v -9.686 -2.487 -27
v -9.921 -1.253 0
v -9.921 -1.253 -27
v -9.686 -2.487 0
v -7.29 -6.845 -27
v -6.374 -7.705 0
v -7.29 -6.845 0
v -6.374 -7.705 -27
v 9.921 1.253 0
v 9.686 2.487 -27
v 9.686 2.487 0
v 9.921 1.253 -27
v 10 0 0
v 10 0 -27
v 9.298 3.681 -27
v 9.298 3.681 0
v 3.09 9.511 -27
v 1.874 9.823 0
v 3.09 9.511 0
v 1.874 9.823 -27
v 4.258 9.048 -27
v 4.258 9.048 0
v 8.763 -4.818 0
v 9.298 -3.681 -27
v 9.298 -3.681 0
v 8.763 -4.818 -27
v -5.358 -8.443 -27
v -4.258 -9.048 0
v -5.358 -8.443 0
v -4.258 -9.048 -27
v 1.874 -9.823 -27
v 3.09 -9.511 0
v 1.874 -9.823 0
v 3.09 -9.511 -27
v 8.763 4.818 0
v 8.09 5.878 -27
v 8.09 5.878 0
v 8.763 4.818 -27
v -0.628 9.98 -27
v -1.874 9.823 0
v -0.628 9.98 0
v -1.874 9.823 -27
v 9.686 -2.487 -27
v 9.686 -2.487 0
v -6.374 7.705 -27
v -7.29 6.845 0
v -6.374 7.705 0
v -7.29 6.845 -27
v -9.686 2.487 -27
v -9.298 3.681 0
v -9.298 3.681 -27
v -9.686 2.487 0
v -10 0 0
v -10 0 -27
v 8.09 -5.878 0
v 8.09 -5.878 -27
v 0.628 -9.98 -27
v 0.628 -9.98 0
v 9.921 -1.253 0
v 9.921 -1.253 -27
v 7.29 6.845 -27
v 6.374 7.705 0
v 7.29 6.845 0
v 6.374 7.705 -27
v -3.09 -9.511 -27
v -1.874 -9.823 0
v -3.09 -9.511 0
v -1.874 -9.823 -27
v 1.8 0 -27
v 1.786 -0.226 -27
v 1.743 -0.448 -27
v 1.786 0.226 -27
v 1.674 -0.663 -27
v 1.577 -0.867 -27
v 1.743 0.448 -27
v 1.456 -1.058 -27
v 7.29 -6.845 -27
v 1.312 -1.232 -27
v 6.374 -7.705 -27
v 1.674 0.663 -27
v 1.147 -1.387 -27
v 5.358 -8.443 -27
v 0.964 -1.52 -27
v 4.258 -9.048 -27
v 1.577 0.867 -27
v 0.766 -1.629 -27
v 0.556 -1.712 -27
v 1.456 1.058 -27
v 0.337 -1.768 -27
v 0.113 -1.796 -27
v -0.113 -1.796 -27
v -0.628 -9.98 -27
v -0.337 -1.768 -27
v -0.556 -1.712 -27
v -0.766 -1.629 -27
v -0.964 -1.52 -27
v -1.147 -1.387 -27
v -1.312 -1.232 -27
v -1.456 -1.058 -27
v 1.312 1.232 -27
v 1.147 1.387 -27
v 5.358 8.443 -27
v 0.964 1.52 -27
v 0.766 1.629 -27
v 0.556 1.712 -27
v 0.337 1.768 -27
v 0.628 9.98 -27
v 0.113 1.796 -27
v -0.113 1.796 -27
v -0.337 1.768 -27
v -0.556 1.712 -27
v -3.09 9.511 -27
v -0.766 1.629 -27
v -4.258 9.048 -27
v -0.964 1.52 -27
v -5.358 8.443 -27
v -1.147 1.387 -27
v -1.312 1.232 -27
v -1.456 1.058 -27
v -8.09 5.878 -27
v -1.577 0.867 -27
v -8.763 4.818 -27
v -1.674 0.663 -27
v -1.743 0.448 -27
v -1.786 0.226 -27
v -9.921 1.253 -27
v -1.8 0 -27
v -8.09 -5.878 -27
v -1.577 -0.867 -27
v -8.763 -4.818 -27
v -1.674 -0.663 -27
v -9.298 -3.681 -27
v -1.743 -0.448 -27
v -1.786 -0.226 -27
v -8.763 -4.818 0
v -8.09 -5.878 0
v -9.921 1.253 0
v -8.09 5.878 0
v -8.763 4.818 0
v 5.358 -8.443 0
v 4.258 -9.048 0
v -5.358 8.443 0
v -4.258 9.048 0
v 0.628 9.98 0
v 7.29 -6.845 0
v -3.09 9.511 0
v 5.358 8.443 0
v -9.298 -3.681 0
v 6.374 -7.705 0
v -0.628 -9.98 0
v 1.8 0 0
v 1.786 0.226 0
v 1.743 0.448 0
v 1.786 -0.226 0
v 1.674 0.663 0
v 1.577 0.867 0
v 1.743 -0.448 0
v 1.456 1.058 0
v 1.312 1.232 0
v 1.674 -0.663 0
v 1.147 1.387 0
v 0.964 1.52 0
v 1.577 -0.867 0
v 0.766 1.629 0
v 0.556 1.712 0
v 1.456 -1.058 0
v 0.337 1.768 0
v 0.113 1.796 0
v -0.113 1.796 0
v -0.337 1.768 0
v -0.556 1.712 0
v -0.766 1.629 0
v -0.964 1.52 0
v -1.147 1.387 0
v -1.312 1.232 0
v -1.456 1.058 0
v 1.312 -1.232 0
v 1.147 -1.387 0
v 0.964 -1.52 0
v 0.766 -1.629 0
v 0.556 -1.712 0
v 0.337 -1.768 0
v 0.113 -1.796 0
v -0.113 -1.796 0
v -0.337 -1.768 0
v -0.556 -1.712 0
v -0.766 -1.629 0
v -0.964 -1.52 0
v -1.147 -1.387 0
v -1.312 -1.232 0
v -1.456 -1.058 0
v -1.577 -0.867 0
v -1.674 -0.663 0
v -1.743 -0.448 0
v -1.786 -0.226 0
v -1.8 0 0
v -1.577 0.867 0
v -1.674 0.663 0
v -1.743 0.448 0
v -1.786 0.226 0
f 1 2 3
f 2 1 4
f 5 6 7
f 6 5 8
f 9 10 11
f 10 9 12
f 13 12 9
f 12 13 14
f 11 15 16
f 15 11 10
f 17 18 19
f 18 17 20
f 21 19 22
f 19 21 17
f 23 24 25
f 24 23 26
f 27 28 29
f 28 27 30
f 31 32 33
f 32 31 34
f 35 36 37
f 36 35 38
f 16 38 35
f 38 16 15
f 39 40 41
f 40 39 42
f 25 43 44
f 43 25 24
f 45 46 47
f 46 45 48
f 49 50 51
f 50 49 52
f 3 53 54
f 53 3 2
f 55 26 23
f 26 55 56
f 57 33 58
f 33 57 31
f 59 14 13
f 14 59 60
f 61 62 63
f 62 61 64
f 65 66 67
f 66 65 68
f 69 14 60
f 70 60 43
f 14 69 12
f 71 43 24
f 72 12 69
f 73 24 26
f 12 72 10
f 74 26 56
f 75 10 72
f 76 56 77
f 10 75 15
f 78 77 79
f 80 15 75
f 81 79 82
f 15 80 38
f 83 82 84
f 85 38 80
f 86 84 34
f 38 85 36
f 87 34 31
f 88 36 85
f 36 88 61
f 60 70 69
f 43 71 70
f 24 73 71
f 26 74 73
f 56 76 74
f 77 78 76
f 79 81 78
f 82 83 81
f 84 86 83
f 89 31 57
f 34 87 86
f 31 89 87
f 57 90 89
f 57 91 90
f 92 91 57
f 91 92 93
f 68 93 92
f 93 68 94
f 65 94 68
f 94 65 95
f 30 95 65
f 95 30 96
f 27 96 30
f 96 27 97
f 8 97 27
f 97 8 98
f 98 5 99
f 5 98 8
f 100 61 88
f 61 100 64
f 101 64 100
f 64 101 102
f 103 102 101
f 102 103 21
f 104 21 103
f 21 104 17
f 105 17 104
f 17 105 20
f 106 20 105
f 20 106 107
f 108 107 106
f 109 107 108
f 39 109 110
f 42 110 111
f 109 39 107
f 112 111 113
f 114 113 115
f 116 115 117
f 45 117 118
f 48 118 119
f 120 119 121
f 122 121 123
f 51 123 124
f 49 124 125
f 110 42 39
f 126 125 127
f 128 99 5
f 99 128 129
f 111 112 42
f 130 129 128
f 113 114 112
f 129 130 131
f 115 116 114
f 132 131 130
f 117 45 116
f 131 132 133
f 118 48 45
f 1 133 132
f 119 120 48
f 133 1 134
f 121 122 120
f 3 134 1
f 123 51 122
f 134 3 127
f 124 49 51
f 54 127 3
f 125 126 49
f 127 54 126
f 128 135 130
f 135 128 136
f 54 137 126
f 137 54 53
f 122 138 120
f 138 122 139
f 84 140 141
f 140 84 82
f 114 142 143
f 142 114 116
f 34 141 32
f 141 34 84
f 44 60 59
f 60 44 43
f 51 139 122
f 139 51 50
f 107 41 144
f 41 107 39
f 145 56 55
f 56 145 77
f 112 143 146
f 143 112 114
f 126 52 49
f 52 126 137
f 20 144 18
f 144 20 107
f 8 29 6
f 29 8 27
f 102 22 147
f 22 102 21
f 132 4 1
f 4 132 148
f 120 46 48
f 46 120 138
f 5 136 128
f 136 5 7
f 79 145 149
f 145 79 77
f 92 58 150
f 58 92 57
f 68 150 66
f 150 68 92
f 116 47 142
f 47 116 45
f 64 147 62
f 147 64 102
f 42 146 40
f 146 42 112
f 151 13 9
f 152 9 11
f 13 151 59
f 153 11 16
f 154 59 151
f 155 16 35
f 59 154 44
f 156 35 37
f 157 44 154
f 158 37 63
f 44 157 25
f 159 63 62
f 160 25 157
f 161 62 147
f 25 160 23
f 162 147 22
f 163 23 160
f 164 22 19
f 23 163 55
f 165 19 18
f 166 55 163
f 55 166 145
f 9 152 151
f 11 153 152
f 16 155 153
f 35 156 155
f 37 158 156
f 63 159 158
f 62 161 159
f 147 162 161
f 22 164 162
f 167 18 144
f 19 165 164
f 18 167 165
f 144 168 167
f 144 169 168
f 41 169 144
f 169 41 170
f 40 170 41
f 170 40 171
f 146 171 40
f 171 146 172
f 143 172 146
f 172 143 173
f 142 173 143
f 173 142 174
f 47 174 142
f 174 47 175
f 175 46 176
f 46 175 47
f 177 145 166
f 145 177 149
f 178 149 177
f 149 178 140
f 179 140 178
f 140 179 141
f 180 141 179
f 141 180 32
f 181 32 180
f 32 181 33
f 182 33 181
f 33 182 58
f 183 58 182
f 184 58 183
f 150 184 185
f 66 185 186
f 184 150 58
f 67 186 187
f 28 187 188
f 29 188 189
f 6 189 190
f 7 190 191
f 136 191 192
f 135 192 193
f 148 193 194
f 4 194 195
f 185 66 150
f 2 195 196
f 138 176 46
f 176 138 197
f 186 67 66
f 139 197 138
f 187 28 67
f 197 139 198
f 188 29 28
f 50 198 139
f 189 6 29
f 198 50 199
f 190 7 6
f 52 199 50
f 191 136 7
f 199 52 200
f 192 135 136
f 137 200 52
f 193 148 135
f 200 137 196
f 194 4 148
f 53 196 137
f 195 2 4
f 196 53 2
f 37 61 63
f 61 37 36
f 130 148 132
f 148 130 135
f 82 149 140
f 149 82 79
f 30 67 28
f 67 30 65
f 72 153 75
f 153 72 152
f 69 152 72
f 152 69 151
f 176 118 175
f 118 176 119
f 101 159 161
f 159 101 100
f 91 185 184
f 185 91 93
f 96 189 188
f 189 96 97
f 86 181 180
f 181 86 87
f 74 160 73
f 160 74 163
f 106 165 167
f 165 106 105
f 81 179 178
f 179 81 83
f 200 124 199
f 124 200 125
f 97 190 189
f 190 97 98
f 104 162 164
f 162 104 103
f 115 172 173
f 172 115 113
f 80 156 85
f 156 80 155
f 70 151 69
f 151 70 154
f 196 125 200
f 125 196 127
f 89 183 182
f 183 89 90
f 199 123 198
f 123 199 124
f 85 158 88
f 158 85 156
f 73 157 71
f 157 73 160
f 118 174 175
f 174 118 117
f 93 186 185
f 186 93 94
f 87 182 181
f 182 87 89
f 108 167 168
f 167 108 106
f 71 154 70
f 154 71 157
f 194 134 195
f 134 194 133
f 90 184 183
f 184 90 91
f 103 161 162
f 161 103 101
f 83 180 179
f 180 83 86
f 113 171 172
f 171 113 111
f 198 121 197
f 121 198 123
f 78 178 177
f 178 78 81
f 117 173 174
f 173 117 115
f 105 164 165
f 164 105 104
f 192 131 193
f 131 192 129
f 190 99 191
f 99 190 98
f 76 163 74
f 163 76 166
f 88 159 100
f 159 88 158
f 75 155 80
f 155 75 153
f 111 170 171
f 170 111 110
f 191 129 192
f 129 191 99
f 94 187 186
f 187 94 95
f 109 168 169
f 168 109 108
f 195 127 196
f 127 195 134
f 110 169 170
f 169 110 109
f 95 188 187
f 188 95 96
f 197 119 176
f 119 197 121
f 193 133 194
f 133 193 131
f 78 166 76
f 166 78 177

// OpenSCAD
$fn = 50;


difference() {
	union() {
		translate(v = [0, 0, -27.0000000000]) {
			cylinder(h = 27, r = 10.0000000000);
		}
		cylinder(h = 0, r = 19.0000000000);
	}
	union() {
		#translate(v = [0, 0, -27]) {
			cylinder(h = 27, r = 1.8000000000);
		}
	}
}
